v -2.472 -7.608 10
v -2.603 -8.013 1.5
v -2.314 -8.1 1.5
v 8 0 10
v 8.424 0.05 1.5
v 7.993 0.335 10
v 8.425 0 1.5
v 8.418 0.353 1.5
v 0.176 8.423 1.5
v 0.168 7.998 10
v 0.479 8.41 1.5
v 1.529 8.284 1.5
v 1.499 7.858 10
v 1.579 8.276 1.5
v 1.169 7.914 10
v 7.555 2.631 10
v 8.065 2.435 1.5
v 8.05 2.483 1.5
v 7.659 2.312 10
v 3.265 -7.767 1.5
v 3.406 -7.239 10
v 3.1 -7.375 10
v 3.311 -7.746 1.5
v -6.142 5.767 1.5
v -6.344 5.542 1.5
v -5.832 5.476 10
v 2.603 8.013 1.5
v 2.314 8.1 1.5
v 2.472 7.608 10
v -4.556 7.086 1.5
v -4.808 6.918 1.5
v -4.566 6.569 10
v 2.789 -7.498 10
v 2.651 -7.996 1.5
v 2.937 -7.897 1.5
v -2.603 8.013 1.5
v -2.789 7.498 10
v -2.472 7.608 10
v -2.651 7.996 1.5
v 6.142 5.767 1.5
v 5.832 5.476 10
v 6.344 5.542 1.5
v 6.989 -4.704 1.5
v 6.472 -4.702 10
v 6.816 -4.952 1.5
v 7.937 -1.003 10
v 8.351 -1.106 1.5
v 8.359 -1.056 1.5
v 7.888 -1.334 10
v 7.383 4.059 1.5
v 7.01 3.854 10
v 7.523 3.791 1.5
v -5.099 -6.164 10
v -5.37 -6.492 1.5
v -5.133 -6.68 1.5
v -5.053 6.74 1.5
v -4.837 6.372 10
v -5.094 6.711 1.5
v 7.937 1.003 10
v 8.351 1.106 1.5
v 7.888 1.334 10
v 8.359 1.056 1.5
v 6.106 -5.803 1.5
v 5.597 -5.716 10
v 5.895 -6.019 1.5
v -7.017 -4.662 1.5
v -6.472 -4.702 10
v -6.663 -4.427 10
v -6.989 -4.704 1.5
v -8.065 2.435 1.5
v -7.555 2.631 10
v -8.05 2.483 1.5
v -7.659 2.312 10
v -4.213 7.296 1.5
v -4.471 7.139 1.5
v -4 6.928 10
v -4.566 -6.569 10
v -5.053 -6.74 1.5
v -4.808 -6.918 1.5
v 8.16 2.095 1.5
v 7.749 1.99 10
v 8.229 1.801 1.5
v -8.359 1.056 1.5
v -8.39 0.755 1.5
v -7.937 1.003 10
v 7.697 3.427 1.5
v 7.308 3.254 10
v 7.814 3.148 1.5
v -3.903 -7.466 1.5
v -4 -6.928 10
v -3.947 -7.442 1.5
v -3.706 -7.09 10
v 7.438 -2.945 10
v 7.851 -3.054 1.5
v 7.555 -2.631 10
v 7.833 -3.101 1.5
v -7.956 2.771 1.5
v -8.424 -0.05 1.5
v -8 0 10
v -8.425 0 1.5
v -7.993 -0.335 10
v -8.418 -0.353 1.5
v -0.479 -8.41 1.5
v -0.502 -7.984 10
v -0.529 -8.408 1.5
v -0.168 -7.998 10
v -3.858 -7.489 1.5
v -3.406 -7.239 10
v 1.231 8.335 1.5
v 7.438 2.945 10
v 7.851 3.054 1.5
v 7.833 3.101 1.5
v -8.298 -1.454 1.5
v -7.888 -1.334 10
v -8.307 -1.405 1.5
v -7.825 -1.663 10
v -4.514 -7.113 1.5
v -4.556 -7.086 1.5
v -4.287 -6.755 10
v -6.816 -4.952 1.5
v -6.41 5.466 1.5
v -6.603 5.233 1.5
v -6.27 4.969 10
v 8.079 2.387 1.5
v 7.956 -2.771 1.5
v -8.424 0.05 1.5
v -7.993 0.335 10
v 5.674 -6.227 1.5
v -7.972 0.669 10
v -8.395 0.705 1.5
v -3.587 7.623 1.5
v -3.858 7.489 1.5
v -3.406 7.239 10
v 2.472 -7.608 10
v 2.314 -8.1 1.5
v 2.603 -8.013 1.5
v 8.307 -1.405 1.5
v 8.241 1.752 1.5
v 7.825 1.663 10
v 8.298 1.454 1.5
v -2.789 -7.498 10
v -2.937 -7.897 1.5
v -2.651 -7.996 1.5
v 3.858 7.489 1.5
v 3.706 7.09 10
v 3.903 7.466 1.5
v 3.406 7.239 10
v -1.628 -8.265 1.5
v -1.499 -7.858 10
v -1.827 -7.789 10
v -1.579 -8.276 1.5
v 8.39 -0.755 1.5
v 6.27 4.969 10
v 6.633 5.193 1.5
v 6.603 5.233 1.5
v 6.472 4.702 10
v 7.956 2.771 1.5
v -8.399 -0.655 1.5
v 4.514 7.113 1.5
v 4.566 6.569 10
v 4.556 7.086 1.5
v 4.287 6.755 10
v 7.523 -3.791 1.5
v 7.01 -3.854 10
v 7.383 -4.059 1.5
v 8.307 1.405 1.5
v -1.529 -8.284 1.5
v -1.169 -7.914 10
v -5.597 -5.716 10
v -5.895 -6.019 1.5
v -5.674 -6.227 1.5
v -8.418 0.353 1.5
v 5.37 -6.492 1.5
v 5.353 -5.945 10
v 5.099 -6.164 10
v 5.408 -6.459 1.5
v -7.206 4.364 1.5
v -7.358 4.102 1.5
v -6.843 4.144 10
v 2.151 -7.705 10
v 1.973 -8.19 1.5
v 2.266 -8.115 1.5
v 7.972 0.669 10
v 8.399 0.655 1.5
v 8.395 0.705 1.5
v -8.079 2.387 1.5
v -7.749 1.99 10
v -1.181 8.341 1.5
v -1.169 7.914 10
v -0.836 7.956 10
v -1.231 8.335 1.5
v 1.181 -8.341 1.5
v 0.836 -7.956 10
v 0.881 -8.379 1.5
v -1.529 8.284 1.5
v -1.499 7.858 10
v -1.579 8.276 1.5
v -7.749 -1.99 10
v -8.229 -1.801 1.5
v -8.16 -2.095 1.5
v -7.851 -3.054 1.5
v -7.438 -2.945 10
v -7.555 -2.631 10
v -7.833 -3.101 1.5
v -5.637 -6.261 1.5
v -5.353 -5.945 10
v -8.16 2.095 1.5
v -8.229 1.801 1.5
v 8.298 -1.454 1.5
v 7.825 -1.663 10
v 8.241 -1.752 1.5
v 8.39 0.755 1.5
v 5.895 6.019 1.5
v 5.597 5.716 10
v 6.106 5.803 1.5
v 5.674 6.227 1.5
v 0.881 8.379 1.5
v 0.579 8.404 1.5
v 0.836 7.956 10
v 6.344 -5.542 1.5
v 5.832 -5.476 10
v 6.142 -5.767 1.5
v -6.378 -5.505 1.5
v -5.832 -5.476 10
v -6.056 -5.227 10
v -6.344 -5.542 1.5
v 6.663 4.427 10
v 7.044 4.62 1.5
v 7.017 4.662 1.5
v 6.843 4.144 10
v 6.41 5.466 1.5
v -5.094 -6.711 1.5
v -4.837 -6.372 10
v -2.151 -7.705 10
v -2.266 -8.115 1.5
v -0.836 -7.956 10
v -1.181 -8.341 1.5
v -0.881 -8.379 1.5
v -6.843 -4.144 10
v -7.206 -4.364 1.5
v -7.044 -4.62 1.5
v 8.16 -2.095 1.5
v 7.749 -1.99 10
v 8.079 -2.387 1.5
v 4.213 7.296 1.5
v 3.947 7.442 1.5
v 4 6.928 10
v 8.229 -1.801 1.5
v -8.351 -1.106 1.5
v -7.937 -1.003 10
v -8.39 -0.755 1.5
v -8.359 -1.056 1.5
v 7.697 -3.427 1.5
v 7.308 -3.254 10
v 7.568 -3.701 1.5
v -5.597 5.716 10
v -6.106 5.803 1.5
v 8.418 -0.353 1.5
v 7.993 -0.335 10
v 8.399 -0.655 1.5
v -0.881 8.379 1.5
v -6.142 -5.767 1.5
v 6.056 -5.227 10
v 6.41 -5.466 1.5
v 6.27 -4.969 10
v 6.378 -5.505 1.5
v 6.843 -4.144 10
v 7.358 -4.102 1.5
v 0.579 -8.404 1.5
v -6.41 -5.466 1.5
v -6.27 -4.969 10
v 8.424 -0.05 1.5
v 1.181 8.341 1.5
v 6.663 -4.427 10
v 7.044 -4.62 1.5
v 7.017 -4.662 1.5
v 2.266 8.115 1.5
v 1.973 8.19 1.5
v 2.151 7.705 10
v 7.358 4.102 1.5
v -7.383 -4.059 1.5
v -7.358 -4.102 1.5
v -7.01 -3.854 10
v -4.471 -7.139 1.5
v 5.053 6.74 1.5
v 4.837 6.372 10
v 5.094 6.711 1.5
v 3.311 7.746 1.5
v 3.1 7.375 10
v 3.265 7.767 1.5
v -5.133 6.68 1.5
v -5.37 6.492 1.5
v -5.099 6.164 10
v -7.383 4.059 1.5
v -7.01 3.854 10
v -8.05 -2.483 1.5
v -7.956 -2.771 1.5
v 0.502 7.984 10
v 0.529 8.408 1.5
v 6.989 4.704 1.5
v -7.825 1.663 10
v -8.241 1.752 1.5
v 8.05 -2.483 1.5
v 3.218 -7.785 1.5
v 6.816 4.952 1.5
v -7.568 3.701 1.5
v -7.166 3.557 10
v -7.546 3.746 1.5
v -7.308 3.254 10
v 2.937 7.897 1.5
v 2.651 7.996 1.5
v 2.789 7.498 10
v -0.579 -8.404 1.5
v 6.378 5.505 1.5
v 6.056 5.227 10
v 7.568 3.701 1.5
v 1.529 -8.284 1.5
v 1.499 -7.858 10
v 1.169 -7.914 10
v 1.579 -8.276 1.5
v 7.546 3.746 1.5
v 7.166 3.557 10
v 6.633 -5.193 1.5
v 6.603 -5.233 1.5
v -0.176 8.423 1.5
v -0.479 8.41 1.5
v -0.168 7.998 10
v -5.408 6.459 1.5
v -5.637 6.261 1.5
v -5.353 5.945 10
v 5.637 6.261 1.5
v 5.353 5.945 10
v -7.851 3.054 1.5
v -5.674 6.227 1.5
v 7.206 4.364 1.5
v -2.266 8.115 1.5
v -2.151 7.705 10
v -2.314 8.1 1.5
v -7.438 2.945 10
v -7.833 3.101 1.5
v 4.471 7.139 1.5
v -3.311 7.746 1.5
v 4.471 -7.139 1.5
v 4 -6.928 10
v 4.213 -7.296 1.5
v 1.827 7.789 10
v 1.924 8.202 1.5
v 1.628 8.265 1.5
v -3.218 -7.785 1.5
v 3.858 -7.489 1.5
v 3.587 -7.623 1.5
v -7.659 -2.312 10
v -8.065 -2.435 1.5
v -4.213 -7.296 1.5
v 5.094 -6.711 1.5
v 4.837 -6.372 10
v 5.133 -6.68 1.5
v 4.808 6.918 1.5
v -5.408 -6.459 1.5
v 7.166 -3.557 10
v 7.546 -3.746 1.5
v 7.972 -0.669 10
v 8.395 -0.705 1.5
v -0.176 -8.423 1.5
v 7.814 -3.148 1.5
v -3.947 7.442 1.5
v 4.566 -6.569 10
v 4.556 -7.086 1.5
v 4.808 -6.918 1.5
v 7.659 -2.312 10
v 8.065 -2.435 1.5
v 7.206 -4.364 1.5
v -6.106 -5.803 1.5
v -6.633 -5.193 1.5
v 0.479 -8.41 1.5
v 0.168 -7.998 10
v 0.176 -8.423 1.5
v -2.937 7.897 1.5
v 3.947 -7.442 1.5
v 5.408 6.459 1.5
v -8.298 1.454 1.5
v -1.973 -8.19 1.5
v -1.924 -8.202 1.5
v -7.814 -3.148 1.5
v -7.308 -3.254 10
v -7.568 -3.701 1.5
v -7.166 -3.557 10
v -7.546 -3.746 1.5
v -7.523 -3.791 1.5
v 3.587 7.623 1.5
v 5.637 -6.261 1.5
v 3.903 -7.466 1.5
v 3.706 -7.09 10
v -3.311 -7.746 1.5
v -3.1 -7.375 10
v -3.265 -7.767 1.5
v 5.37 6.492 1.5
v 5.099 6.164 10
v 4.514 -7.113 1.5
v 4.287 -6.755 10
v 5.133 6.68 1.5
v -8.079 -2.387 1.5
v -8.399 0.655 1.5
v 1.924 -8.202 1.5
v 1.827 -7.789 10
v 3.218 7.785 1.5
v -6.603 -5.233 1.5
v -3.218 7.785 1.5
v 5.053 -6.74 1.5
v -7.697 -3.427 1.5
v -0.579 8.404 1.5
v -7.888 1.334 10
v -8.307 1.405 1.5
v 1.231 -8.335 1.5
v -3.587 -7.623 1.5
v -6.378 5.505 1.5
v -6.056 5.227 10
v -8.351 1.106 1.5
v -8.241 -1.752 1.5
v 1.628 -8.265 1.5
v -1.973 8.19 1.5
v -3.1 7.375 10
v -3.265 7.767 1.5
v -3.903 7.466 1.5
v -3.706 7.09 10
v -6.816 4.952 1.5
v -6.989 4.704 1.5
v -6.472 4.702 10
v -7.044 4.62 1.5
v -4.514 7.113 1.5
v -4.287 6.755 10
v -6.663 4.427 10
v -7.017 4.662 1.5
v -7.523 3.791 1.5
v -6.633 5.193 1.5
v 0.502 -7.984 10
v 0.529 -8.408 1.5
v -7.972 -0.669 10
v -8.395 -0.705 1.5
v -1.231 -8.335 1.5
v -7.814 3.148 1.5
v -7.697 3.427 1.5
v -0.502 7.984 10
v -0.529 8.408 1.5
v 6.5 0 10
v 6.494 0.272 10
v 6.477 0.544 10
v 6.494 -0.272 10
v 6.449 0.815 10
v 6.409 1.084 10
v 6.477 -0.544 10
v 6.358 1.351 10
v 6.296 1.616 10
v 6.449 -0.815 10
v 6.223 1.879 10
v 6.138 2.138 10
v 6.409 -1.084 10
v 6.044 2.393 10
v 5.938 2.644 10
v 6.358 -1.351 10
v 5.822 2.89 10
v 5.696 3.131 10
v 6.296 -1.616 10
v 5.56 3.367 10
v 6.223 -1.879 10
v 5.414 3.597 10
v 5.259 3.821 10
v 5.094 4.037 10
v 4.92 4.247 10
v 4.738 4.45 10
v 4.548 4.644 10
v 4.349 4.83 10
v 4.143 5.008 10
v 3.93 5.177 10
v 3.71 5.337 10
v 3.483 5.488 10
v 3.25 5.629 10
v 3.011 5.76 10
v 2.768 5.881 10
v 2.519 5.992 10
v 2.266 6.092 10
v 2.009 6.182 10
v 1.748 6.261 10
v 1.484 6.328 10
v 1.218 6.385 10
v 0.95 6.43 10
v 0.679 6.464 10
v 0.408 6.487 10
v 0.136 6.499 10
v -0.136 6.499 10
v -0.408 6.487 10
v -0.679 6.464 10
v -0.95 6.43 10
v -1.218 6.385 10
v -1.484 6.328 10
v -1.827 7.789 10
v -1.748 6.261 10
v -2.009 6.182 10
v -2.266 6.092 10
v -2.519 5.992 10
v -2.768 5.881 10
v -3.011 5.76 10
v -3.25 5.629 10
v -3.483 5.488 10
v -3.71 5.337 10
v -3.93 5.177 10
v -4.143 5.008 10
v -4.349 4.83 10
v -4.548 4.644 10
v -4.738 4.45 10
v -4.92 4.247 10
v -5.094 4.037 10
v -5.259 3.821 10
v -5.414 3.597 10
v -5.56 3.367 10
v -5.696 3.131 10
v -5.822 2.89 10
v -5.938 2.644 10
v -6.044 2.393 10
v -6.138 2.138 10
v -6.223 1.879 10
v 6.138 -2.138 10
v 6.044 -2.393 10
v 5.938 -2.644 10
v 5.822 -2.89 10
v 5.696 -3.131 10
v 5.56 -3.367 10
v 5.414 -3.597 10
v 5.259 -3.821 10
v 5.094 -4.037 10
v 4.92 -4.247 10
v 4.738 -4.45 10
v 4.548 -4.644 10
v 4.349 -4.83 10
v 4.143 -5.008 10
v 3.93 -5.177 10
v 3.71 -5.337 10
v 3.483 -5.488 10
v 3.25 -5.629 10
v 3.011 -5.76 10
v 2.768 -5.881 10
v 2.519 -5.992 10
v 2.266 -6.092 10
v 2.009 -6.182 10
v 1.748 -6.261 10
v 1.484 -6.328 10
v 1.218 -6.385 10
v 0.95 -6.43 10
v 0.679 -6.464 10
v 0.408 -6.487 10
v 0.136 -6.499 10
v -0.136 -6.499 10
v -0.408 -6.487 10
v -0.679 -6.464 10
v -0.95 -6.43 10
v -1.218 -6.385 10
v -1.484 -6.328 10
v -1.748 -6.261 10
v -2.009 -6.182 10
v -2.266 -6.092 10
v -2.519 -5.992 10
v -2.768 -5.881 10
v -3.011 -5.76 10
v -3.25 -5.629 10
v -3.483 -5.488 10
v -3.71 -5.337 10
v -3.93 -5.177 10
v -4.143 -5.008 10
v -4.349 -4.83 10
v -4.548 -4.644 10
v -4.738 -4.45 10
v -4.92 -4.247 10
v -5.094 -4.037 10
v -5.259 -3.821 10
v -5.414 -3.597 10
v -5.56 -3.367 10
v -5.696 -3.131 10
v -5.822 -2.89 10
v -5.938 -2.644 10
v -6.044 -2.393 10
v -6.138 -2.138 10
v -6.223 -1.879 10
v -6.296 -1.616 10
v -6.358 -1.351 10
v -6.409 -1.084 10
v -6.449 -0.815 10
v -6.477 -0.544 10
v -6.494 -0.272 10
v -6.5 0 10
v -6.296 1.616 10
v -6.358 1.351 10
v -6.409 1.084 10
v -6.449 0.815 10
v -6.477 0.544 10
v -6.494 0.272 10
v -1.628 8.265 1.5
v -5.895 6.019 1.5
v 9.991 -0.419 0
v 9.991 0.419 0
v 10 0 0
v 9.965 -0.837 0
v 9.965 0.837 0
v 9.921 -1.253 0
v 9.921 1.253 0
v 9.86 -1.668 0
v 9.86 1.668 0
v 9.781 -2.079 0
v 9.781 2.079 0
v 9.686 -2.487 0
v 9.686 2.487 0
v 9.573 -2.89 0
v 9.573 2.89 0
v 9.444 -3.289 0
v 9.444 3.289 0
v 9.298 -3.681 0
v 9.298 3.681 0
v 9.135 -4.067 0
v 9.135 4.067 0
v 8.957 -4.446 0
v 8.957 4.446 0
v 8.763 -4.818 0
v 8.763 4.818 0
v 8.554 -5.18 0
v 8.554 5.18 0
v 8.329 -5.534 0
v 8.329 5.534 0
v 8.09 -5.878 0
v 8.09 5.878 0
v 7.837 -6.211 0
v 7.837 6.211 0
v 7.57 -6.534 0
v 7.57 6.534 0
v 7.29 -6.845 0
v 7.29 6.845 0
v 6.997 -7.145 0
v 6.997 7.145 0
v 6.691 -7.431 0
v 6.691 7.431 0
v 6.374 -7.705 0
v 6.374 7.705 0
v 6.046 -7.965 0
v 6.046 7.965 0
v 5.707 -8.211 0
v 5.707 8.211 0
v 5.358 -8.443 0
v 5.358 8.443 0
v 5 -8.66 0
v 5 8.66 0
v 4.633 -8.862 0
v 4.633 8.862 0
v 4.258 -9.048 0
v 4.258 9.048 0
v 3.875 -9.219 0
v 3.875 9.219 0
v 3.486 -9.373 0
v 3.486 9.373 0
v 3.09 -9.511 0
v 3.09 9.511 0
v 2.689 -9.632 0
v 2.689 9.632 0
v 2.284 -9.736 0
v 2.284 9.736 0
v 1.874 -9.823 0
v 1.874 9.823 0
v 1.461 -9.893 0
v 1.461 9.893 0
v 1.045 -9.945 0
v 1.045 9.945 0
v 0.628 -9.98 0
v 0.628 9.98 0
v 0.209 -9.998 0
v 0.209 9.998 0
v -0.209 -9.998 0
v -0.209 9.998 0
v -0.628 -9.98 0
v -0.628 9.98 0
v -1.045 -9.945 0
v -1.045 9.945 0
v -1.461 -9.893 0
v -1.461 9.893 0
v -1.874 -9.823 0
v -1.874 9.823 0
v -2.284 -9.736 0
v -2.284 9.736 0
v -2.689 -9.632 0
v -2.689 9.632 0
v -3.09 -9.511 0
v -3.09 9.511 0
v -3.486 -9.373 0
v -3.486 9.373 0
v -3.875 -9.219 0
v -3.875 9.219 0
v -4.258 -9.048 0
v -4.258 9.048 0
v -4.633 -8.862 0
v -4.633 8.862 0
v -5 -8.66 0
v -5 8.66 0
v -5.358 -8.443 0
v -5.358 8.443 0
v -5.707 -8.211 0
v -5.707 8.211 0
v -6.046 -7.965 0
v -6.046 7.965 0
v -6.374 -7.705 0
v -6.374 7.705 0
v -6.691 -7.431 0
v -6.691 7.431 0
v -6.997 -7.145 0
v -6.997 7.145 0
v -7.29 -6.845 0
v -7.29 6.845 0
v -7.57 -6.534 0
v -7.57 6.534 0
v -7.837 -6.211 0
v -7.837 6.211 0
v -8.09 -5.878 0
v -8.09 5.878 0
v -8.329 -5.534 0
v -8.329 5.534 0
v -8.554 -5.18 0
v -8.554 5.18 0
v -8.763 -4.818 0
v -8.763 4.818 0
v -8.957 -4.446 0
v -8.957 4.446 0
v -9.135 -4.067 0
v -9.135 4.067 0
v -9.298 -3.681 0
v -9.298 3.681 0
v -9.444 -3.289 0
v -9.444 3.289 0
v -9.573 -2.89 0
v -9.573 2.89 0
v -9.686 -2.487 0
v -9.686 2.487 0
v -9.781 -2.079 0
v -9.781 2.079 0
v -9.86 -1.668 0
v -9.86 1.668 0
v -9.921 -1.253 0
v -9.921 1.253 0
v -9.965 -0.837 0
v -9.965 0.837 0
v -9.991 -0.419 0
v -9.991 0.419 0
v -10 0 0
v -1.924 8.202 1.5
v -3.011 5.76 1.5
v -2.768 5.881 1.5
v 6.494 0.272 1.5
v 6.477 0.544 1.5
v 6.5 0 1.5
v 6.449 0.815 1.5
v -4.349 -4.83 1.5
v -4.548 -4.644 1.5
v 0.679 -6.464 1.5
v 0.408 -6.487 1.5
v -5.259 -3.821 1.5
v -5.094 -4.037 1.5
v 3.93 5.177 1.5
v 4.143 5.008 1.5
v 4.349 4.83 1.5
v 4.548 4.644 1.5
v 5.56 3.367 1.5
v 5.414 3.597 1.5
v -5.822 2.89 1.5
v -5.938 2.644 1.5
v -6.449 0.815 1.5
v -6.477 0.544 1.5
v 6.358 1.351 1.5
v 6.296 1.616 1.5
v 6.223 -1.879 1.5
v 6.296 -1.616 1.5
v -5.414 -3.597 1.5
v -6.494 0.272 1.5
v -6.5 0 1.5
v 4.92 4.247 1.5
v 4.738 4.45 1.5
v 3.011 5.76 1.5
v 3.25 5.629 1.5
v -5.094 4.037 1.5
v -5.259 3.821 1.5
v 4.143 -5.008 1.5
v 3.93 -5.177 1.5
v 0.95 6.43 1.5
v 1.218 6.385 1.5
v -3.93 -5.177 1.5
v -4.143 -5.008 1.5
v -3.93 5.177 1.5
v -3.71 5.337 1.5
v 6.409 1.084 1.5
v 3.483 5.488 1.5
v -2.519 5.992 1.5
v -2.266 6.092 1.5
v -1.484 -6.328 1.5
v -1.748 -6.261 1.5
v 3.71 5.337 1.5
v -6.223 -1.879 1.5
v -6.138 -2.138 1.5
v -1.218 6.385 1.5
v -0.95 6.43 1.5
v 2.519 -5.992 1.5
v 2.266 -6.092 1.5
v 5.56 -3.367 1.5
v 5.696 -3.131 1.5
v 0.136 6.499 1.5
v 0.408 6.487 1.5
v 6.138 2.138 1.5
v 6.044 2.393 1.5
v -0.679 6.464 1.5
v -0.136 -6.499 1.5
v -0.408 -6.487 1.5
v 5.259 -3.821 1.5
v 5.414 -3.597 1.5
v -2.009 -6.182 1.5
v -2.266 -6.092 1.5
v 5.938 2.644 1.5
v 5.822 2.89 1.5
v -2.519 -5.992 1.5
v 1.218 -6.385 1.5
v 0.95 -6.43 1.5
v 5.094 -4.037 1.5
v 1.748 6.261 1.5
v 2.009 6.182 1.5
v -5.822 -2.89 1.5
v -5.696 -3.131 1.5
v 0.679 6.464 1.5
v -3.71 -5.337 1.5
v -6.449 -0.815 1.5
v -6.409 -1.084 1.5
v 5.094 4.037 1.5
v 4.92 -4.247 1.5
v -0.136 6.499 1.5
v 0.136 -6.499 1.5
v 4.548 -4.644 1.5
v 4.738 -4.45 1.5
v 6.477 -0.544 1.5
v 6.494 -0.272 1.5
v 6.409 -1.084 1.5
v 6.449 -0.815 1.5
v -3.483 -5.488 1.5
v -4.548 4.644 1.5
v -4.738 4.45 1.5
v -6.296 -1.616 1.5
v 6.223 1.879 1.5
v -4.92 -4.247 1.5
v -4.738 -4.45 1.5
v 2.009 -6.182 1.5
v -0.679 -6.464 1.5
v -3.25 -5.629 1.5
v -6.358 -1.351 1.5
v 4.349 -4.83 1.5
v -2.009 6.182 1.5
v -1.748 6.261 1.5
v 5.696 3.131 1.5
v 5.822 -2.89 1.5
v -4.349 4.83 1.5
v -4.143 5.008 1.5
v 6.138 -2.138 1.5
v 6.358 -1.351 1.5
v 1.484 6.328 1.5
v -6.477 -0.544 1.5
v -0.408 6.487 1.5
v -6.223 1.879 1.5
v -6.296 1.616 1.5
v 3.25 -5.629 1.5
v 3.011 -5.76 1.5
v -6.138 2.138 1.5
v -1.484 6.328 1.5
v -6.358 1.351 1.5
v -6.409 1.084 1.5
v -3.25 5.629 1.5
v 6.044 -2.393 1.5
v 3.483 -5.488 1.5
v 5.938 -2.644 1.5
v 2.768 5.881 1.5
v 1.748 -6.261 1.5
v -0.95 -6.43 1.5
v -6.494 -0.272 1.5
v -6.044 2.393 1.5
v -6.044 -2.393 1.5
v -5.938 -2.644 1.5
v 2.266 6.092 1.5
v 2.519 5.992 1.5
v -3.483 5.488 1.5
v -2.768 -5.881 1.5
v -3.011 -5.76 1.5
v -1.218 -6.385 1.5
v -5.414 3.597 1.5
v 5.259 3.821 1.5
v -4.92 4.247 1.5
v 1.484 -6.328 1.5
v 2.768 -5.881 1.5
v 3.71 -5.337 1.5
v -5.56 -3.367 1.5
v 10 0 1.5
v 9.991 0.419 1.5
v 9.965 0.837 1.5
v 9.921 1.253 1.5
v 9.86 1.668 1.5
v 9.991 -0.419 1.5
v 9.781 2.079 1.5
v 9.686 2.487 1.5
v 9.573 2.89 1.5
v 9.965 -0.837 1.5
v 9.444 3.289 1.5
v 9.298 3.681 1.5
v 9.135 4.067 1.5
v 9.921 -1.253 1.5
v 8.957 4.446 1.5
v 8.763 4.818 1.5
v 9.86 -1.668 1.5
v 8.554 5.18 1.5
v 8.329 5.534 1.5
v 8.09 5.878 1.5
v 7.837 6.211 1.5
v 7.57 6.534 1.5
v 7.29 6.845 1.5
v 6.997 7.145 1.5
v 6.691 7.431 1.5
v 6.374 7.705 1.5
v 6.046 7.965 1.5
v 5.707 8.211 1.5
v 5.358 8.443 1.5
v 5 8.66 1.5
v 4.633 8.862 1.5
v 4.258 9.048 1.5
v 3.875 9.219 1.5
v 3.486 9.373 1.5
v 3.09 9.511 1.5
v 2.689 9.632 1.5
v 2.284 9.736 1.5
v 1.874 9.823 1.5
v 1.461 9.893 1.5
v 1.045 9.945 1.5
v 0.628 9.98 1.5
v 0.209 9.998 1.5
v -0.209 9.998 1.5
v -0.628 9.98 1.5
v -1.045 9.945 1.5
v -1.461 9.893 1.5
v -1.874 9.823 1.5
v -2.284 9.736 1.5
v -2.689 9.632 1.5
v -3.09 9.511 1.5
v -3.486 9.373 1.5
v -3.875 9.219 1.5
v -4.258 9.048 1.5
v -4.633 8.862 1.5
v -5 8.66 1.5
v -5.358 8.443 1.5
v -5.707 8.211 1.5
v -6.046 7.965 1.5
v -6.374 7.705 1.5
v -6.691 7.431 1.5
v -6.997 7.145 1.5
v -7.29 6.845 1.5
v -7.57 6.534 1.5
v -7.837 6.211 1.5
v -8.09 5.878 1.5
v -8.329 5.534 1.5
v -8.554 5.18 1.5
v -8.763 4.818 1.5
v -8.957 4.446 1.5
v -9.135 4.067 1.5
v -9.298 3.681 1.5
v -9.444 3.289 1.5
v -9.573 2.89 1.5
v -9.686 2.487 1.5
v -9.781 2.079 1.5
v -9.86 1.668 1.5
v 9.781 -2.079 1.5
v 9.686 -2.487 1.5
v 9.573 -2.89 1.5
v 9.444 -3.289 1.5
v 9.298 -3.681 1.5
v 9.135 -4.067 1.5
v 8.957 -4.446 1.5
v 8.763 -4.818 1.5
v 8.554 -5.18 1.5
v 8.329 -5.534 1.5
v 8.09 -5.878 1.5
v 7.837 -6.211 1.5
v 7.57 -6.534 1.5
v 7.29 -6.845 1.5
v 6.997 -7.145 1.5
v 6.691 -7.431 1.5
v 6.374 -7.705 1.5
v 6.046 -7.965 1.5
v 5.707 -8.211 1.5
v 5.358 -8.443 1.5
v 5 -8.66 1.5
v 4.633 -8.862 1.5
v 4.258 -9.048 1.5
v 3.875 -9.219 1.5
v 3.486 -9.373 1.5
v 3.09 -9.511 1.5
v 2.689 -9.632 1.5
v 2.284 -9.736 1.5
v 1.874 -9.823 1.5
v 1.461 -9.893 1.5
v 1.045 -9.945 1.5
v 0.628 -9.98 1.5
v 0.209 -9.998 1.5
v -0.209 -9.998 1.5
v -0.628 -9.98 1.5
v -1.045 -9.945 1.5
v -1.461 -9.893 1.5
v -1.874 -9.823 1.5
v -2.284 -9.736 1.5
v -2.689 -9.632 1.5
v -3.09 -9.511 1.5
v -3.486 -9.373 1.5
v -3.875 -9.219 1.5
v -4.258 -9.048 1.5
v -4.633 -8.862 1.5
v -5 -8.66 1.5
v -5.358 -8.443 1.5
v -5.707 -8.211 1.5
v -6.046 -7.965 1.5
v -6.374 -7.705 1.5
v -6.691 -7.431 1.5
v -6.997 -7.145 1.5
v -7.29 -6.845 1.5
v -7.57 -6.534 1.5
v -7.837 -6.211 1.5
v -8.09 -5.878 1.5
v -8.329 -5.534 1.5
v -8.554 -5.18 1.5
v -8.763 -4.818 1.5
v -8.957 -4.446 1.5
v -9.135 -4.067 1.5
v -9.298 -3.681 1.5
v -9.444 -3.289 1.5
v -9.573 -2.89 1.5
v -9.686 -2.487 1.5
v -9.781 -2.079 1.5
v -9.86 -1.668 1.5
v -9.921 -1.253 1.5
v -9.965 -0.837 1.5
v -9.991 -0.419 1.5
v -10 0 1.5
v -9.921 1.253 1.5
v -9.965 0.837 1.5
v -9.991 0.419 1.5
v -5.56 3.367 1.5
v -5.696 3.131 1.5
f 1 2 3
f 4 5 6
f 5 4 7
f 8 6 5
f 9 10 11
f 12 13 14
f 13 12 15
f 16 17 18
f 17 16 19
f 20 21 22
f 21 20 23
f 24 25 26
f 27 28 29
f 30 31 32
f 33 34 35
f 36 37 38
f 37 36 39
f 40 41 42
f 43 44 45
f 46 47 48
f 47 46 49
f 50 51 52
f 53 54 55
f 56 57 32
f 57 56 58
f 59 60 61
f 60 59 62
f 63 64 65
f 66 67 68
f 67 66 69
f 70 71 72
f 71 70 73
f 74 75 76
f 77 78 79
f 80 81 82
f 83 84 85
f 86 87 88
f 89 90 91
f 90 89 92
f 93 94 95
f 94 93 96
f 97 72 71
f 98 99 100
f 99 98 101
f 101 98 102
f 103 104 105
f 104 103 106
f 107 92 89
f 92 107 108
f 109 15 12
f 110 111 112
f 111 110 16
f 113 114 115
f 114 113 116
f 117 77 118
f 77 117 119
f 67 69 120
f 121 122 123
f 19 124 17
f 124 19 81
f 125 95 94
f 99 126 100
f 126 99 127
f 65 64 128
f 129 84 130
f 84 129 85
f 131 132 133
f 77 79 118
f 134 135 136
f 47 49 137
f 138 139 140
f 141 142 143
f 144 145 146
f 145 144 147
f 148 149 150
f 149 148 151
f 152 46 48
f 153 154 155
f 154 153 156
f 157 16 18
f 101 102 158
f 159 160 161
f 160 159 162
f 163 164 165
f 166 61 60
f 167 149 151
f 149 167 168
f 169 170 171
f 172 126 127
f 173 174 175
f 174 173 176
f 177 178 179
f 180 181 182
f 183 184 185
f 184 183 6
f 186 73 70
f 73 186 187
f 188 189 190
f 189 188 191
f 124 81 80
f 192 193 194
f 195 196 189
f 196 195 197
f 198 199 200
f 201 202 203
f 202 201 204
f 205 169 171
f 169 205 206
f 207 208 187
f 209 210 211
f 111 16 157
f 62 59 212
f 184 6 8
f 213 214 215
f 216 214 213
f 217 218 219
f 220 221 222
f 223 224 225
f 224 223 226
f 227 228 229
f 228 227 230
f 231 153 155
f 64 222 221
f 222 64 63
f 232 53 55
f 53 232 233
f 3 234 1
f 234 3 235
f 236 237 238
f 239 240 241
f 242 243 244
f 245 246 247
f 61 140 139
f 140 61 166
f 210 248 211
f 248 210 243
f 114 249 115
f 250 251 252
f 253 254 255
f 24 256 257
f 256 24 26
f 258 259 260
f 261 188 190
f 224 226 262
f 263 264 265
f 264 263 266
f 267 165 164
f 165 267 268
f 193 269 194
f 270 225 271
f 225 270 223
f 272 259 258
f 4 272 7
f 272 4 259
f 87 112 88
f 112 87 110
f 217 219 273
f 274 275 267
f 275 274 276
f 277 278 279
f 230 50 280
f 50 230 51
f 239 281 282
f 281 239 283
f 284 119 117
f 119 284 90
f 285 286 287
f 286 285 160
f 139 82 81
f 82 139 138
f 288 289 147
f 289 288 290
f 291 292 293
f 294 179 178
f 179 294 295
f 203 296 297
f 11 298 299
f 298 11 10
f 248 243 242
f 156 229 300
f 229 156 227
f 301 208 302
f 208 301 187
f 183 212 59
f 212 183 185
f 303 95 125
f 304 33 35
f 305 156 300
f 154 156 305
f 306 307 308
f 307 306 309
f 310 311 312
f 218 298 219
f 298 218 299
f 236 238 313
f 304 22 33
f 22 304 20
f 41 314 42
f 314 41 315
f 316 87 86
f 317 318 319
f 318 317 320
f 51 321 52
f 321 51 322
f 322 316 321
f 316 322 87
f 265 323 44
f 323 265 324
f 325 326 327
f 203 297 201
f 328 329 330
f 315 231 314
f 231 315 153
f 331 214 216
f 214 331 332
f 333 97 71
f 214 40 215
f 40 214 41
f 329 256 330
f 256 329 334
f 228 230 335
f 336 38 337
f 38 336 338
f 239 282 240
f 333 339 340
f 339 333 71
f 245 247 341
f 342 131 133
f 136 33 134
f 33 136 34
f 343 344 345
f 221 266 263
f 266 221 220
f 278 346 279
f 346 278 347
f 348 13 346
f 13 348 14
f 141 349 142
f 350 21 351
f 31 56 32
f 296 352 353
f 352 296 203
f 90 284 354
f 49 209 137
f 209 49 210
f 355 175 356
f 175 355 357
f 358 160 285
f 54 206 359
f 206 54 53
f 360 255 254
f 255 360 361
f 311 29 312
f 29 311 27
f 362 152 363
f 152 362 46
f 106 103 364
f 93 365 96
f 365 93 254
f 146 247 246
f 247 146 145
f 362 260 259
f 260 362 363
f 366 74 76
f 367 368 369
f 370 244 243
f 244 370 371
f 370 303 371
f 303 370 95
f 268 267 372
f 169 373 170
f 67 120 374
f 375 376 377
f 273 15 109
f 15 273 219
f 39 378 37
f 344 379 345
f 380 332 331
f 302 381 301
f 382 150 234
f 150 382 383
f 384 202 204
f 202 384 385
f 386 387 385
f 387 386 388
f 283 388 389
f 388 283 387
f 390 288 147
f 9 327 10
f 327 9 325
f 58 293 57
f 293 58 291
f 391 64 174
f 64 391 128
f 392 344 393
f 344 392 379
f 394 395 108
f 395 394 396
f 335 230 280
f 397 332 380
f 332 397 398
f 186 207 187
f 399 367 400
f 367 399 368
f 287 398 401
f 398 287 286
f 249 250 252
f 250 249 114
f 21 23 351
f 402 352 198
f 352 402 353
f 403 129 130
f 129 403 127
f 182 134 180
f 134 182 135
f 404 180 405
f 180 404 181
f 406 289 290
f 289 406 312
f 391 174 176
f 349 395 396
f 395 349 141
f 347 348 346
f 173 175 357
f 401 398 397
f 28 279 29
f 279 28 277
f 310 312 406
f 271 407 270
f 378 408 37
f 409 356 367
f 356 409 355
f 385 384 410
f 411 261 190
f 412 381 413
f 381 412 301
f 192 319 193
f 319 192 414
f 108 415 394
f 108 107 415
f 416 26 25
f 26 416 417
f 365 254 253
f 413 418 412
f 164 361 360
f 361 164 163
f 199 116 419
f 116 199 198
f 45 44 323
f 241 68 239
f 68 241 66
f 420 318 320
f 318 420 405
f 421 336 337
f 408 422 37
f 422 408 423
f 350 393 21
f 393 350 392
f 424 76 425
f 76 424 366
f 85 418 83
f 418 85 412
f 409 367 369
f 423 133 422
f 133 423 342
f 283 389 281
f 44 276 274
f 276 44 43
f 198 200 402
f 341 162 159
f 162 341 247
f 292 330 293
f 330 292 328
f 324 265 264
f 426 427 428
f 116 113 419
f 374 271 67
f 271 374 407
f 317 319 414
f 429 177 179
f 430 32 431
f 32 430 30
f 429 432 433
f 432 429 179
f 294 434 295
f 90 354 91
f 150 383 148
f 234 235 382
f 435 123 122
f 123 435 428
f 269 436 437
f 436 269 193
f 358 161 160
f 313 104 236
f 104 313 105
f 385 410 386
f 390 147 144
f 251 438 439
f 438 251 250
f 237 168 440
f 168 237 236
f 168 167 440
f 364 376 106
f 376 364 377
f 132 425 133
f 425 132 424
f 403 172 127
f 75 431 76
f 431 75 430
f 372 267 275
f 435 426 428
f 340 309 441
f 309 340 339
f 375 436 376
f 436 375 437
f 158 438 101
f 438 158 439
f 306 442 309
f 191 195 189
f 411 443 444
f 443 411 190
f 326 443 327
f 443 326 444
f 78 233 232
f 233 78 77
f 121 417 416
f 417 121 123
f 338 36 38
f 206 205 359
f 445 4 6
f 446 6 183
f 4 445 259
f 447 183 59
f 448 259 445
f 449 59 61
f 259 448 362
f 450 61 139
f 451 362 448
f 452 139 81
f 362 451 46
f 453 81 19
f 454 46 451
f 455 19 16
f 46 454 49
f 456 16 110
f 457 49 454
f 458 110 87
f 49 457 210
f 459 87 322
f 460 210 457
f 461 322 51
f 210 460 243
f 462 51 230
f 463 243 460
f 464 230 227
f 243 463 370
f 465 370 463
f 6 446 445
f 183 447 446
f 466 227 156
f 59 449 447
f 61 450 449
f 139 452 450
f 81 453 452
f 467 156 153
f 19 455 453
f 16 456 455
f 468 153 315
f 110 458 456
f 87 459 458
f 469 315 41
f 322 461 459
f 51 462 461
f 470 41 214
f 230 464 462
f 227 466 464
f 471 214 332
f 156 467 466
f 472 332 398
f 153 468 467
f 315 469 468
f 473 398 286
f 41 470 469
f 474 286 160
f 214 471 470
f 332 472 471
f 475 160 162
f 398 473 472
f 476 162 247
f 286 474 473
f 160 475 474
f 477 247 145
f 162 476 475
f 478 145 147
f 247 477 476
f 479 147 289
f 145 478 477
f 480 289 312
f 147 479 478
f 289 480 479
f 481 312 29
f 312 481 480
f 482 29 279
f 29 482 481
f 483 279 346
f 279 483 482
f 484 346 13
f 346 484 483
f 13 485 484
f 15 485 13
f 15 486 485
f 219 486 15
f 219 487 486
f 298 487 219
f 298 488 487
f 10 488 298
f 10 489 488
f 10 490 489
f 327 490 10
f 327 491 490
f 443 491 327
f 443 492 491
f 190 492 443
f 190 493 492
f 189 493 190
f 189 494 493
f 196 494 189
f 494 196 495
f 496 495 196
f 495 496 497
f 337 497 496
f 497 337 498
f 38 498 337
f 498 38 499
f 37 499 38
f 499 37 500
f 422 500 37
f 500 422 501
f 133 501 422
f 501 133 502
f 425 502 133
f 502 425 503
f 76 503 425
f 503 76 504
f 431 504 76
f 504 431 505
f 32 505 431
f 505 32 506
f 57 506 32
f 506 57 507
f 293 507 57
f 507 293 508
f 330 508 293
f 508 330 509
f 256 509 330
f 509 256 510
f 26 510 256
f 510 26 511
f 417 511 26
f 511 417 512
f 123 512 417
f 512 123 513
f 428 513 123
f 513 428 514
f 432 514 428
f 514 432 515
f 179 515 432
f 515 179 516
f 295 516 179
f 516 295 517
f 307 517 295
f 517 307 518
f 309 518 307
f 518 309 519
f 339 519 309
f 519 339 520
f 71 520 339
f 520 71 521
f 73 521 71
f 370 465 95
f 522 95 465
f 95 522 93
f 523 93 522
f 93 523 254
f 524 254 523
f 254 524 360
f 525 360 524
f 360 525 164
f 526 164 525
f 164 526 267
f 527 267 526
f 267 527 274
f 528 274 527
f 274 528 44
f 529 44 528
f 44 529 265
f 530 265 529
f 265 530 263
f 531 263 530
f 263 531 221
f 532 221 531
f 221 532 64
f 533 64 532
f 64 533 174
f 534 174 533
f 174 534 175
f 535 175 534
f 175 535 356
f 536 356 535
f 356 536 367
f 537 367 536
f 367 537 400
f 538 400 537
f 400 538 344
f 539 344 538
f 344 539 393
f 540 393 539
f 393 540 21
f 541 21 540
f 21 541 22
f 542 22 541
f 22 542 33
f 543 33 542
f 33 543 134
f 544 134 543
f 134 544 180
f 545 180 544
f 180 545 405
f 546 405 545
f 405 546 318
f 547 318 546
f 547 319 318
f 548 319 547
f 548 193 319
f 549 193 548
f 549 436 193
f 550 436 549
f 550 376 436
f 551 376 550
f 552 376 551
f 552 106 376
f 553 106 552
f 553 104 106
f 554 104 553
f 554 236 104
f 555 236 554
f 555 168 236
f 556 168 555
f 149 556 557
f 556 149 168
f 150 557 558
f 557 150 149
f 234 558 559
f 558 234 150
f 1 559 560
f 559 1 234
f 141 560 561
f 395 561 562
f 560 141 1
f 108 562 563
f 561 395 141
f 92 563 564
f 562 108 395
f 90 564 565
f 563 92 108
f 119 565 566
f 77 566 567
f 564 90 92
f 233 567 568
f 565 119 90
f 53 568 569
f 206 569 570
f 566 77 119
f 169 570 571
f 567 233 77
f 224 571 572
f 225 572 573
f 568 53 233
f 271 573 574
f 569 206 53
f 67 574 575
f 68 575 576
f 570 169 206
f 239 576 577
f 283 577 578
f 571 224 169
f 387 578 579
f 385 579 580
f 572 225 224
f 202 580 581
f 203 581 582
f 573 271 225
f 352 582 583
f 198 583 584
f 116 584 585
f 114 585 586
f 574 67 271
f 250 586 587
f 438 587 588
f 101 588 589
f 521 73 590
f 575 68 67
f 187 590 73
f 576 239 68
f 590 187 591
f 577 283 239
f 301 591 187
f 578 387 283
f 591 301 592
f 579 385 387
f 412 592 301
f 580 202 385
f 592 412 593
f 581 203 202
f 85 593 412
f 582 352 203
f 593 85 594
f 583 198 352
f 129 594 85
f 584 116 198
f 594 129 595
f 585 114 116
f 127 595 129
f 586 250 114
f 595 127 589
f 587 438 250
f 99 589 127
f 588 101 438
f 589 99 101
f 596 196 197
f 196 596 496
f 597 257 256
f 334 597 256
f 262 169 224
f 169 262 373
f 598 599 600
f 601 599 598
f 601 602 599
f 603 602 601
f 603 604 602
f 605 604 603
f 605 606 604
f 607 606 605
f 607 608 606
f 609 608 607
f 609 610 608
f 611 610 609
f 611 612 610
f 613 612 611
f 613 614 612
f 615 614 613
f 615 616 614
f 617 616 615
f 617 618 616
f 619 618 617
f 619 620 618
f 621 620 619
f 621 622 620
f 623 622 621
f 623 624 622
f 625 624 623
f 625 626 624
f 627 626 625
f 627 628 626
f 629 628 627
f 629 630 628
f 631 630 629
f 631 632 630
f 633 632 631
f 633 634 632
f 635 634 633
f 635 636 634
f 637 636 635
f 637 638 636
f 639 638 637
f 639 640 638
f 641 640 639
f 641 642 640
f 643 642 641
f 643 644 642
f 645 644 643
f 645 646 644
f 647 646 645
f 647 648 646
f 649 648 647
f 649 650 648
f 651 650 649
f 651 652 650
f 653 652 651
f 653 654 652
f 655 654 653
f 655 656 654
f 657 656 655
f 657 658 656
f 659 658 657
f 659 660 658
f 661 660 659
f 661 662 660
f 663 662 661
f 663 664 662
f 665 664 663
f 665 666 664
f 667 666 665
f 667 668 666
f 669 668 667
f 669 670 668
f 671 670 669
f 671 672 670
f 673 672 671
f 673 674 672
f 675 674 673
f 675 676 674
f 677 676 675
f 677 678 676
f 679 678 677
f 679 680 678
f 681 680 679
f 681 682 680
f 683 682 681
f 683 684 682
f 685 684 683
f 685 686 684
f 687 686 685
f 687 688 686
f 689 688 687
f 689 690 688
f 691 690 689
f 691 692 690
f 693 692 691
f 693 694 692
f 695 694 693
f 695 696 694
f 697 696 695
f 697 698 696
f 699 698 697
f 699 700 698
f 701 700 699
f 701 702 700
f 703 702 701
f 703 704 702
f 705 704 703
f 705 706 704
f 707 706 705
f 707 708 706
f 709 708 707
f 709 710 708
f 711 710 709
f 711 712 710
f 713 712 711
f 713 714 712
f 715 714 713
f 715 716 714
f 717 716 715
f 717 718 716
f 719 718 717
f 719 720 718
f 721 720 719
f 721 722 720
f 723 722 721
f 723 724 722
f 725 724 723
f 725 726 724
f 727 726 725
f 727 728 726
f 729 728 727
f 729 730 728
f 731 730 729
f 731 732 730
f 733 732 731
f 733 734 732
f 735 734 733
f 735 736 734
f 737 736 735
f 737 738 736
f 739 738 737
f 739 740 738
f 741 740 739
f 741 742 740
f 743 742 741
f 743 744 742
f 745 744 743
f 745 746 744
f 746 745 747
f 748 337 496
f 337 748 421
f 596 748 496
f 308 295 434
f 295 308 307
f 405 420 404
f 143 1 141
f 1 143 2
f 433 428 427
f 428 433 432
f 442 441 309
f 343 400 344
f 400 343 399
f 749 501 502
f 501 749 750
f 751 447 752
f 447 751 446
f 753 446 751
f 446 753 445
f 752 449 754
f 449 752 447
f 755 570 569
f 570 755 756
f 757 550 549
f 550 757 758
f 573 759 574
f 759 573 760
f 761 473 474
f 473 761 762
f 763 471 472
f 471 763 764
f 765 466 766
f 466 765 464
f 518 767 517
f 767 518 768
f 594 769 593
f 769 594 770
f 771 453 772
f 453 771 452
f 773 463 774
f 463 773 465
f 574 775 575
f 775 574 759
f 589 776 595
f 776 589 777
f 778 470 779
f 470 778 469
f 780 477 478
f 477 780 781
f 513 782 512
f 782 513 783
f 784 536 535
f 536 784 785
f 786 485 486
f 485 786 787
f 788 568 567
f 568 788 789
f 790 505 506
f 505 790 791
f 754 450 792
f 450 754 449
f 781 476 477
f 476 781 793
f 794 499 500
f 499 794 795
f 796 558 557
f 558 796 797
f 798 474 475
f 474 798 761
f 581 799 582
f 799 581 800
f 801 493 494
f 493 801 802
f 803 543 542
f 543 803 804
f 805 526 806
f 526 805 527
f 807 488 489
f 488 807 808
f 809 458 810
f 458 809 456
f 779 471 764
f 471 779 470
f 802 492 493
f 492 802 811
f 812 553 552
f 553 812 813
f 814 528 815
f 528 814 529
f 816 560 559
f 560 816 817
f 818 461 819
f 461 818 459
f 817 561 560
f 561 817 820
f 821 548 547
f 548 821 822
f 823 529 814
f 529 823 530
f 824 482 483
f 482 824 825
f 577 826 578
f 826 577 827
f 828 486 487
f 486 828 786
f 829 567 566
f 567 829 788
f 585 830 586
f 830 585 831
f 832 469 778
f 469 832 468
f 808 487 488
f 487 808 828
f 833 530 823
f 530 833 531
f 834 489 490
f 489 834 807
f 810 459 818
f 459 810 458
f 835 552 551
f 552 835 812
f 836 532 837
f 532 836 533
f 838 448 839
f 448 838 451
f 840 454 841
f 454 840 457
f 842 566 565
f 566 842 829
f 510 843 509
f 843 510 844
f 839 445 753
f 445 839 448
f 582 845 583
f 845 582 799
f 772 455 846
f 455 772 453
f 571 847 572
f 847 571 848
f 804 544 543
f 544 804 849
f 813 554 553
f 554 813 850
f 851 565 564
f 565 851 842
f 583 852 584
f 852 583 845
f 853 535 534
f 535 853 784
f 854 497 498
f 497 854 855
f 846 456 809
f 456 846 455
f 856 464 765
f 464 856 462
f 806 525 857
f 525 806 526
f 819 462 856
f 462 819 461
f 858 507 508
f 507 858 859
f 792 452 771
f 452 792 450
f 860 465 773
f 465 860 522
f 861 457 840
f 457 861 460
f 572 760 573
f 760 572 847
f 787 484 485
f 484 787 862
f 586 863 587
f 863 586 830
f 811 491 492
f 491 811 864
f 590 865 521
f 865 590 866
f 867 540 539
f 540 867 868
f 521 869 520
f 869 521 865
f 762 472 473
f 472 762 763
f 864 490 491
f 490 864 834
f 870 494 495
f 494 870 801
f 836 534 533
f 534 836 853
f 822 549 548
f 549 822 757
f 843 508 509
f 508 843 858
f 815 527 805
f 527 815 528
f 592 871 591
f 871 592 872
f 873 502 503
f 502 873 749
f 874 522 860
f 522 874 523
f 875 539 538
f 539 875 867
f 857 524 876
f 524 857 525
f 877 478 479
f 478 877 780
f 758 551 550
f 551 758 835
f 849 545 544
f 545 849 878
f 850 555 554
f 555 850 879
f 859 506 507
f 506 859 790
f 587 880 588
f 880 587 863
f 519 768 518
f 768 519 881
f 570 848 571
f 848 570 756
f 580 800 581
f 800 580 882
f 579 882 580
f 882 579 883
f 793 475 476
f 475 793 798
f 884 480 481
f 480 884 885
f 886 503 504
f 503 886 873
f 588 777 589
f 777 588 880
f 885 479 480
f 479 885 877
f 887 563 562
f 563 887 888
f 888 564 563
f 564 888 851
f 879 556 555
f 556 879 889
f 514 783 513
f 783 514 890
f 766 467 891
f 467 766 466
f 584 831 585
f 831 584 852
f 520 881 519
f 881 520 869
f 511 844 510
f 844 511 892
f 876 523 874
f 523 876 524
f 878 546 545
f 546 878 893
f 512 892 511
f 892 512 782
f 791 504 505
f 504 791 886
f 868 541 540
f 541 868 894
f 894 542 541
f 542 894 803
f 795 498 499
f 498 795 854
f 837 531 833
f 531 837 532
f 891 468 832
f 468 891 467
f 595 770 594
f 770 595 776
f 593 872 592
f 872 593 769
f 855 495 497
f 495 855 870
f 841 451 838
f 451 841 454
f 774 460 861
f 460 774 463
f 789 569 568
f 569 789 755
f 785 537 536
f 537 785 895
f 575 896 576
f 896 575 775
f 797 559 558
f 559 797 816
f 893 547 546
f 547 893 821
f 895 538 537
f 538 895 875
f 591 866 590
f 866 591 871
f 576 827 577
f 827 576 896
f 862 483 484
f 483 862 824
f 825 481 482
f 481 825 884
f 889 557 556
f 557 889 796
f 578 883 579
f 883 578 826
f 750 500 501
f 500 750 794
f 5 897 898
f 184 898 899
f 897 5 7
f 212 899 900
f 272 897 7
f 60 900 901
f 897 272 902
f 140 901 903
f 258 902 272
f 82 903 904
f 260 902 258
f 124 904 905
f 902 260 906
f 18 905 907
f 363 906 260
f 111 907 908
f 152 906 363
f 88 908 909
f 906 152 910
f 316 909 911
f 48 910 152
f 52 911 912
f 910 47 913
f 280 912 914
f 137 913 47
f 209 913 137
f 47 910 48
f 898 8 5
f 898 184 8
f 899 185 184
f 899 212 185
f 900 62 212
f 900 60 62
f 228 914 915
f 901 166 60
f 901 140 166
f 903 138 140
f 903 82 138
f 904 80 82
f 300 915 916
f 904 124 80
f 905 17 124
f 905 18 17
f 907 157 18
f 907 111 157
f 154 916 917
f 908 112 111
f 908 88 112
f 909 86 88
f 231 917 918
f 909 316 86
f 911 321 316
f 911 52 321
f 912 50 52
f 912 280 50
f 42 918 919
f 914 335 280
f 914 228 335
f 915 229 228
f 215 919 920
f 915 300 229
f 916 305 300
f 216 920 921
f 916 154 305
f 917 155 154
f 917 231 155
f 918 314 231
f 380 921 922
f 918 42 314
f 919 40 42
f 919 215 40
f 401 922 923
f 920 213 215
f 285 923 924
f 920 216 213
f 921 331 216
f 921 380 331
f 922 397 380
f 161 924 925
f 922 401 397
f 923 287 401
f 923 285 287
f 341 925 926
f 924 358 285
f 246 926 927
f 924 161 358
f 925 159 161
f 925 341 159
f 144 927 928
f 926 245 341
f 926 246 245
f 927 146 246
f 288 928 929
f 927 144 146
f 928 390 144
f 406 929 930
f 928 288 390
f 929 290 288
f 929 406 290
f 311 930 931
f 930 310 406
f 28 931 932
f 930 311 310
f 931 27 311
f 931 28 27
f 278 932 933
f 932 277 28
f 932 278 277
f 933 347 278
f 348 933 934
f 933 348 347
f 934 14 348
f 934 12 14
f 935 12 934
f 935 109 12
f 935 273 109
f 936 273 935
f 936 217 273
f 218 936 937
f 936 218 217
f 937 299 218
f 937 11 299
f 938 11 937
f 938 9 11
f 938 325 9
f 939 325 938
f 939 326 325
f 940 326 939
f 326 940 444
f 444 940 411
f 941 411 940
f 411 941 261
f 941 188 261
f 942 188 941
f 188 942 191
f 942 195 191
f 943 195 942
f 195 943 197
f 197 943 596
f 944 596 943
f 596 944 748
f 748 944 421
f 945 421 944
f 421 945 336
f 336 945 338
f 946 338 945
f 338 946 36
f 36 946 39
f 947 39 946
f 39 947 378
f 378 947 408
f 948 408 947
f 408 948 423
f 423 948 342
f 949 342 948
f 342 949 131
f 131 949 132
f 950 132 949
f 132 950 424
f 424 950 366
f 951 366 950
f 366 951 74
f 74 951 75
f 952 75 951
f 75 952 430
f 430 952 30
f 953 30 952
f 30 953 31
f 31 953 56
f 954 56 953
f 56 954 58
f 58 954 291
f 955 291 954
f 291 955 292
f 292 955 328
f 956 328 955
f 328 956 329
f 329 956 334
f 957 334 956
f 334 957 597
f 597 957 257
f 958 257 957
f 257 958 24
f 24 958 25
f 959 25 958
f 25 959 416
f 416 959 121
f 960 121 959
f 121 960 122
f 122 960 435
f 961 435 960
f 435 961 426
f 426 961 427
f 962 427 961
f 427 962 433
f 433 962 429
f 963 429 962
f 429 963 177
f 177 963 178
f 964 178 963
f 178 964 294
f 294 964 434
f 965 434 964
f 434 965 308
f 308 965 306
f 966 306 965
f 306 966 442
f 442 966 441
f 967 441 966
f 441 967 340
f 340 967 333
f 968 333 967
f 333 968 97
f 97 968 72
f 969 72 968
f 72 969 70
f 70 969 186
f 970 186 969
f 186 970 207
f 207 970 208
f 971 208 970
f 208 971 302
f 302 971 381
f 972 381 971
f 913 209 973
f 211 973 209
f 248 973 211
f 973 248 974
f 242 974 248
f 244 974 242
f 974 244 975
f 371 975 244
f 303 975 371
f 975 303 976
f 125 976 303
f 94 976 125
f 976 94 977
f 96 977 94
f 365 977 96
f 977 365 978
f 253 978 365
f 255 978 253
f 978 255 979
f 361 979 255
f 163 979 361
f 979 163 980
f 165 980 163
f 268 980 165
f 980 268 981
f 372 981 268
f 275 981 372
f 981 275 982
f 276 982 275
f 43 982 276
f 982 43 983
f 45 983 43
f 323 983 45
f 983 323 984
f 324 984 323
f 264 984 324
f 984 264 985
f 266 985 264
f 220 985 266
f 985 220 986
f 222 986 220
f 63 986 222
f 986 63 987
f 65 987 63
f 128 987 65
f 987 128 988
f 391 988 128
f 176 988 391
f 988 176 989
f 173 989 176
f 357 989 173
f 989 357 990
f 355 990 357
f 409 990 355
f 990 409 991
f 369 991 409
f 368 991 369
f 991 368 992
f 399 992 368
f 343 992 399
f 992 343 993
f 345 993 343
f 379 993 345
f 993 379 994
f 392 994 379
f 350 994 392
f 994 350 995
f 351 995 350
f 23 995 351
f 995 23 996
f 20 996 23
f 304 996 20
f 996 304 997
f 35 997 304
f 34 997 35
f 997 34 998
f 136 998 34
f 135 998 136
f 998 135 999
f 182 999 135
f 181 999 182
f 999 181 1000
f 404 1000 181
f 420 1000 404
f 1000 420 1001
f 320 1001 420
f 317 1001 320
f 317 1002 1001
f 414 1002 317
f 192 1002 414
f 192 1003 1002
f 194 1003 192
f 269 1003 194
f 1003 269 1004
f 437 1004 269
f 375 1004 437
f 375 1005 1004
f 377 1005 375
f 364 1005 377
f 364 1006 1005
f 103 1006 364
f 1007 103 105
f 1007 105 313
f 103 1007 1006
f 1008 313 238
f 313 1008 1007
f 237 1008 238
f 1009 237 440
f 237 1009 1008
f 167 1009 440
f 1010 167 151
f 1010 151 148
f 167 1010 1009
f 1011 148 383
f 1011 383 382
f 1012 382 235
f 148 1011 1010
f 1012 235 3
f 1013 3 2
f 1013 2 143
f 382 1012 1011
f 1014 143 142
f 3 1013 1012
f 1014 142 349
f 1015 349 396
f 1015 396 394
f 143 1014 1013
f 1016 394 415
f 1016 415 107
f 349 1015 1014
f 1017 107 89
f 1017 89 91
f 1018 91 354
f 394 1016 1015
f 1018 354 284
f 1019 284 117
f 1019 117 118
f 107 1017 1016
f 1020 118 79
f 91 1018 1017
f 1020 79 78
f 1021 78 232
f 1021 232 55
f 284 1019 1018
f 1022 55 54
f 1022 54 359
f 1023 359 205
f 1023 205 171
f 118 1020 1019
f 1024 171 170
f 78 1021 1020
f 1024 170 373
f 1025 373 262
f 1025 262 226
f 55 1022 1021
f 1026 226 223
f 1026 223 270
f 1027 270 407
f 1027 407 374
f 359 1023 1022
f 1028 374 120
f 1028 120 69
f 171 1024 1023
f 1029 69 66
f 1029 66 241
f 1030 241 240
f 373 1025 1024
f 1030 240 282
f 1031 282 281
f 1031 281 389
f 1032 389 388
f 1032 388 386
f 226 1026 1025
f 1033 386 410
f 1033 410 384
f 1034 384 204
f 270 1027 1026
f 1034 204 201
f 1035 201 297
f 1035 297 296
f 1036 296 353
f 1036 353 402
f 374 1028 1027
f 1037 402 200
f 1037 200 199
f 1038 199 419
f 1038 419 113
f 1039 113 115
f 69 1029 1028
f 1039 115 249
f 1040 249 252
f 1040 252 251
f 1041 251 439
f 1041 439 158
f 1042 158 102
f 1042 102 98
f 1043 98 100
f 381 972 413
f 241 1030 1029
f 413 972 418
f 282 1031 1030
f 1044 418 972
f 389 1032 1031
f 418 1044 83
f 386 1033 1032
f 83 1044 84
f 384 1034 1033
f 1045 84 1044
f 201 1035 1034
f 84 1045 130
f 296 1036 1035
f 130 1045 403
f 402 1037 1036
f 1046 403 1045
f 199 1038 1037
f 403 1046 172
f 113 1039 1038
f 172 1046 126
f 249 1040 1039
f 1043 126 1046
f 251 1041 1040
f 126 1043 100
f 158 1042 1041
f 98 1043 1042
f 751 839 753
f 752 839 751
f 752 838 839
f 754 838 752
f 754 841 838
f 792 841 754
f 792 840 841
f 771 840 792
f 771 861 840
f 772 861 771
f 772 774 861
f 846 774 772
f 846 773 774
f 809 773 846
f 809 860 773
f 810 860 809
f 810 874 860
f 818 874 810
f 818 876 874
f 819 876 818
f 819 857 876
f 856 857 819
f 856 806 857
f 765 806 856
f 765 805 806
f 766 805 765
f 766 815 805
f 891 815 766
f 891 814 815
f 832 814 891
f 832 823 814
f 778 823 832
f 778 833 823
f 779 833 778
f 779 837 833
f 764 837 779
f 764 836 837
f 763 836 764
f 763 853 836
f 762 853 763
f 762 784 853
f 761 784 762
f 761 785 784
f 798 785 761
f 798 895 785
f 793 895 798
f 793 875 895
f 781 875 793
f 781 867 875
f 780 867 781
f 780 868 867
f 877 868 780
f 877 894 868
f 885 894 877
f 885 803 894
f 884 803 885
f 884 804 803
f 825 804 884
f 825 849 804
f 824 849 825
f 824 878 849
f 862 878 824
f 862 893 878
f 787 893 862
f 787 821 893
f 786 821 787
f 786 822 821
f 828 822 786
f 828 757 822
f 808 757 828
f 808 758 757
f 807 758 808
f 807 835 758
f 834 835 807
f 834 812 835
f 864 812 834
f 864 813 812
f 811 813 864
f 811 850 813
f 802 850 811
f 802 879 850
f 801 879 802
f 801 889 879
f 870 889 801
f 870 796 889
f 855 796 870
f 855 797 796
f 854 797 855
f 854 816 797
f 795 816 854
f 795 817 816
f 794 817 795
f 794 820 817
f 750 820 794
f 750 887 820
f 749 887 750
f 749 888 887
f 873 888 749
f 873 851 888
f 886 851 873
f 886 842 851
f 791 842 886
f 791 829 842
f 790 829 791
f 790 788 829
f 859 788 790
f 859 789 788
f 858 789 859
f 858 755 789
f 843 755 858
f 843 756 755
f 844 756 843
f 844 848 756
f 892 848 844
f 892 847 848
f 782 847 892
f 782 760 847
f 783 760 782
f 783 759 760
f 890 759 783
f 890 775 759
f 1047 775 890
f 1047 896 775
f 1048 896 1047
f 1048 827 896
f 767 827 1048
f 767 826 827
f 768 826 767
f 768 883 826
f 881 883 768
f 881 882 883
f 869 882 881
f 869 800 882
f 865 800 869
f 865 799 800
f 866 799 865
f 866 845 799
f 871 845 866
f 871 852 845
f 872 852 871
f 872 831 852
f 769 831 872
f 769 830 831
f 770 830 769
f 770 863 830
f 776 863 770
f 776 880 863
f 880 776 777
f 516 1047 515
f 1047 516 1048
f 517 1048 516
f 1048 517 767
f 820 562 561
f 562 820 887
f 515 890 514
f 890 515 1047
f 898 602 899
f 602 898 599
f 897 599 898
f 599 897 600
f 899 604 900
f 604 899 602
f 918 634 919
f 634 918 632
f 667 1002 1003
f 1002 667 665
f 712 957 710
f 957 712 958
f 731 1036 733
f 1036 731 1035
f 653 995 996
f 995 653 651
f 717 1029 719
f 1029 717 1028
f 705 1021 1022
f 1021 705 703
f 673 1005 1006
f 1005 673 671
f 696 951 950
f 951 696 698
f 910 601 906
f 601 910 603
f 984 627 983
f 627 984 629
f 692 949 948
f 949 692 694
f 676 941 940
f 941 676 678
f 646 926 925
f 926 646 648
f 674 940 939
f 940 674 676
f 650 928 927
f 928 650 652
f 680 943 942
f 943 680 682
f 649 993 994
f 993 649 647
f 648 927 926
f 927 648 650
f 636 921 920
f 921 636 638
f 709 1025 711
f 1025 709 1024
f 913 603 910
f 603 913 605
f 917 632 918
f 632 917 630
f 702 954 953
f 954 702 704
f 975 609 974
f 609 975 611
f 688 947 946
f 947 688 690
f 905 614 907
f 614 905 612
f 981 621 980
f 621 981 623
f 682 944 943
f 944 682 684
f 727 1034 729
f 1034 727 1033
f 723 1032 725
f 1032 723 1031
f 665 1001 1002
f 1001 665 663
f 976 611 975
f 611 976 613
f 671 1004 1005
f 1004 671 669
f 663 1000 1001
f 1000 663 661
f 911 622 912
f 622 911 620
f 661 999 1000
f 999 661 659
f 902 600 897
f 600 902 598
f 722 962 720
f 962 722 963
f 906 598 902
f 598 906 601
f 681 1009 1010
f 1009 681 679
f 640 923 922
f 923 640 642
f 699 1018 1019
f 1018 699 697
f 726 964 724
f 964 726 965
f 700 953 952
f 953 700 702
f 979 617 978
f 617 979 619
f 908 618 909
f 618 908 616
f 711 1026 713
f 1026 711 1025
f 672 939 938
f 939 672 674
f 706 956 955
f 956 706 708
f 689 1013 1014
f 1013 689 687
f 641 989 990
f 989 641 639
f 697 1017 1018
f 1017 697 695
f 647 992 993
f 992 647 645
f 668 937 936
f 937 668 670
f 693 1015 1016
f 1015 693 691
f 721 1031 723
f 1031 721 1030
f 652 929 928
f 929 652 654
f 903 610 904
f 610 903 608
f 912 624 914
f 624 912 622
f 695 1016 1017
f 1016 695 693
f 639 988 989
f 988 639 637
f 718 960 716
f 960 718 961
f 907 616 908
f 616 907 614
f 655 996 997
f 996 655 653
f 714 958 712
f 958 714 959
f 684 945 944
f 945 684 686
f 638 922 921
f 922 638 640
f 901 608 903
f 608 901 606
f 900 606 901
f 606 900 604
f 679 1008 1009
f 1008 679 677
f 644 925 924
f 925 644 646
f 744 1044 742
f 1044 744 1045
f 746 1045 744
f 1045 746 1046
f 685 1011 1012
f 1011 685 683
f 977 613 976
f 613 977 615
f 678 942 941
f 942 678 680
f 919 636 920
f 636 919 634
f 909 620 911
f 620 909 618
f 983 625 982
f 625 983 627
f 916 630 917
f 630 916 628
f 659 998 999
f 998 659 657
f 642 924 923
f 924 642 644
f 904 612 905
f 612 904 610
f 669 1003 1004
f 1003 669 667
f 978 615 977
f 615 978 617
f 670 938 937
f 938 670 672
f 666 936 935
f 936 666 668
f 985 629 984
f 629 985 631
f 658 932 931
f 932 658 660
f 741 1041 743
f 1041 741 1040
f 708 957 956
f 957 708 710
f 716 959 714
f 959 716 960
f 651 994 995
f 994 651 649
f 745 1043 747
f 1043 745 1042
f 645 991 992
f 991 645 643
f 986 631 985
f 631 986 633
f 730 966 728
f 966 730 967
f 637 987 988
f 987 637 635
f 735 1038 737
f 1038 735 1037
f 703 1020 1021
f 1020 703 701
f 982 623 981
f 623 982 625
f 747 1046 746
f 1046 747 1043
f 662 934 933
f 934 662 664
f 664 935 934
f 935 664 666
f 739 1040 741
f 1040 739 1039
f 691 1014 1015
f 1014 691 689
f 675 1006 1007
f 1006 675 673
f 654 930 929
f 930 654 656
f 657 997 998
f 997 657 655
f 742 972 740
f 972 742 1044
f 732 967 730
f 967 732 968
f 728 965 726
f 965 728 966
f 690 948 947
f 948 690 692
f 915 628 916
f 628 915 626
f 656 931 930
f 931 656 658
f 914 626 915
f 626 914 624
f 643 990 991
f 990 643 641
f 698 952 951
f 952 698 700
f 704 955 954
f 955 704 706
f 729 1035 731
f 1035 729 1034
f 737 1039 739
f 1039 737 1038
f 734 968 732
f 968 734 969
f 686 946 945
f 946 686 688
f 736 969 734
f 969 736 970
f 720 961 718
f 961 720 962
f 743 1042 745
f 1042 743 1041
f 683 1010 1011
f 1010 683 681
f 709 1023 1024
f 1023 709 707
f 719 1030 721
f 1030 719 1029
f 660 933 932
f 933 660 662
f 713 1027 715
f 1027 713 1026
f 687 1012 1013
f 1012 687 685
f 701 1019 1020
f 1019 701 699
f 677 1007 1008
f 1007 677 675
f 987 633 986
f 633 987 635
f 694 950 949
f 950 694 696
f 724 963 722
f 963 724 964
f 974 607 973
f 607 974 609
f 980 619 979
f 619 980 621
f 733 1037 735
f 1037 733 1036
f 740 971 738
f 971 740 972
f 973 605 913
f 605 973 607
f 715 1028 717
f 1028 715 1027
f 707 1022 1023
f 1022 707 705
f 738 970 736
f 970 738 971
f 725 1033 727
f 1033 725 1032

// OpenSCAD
higth=10; //[5:100]
top_with=16; //[5:100]
bottum_with=17; //[5:100]
wall_thikness=1.5; //[0.5:10]
pipe_thikness=1.5; //[0.5:10]

/* [Hidden] */
$fn = 150;
cap();

module cap(){
	cylinder(wall_thikness,((bottum_with/2)+pipe_thikness),((bottum_with/2)+pipe_thikness));
	difference(){	
		cylinder(higth,(bottum_with/2),(top_with/2));
		translate([0,0,wall_thikness])cylinder(h=higth,r=((min(bottum_with,top_with)/2)-wall_thikness));
	}
}
